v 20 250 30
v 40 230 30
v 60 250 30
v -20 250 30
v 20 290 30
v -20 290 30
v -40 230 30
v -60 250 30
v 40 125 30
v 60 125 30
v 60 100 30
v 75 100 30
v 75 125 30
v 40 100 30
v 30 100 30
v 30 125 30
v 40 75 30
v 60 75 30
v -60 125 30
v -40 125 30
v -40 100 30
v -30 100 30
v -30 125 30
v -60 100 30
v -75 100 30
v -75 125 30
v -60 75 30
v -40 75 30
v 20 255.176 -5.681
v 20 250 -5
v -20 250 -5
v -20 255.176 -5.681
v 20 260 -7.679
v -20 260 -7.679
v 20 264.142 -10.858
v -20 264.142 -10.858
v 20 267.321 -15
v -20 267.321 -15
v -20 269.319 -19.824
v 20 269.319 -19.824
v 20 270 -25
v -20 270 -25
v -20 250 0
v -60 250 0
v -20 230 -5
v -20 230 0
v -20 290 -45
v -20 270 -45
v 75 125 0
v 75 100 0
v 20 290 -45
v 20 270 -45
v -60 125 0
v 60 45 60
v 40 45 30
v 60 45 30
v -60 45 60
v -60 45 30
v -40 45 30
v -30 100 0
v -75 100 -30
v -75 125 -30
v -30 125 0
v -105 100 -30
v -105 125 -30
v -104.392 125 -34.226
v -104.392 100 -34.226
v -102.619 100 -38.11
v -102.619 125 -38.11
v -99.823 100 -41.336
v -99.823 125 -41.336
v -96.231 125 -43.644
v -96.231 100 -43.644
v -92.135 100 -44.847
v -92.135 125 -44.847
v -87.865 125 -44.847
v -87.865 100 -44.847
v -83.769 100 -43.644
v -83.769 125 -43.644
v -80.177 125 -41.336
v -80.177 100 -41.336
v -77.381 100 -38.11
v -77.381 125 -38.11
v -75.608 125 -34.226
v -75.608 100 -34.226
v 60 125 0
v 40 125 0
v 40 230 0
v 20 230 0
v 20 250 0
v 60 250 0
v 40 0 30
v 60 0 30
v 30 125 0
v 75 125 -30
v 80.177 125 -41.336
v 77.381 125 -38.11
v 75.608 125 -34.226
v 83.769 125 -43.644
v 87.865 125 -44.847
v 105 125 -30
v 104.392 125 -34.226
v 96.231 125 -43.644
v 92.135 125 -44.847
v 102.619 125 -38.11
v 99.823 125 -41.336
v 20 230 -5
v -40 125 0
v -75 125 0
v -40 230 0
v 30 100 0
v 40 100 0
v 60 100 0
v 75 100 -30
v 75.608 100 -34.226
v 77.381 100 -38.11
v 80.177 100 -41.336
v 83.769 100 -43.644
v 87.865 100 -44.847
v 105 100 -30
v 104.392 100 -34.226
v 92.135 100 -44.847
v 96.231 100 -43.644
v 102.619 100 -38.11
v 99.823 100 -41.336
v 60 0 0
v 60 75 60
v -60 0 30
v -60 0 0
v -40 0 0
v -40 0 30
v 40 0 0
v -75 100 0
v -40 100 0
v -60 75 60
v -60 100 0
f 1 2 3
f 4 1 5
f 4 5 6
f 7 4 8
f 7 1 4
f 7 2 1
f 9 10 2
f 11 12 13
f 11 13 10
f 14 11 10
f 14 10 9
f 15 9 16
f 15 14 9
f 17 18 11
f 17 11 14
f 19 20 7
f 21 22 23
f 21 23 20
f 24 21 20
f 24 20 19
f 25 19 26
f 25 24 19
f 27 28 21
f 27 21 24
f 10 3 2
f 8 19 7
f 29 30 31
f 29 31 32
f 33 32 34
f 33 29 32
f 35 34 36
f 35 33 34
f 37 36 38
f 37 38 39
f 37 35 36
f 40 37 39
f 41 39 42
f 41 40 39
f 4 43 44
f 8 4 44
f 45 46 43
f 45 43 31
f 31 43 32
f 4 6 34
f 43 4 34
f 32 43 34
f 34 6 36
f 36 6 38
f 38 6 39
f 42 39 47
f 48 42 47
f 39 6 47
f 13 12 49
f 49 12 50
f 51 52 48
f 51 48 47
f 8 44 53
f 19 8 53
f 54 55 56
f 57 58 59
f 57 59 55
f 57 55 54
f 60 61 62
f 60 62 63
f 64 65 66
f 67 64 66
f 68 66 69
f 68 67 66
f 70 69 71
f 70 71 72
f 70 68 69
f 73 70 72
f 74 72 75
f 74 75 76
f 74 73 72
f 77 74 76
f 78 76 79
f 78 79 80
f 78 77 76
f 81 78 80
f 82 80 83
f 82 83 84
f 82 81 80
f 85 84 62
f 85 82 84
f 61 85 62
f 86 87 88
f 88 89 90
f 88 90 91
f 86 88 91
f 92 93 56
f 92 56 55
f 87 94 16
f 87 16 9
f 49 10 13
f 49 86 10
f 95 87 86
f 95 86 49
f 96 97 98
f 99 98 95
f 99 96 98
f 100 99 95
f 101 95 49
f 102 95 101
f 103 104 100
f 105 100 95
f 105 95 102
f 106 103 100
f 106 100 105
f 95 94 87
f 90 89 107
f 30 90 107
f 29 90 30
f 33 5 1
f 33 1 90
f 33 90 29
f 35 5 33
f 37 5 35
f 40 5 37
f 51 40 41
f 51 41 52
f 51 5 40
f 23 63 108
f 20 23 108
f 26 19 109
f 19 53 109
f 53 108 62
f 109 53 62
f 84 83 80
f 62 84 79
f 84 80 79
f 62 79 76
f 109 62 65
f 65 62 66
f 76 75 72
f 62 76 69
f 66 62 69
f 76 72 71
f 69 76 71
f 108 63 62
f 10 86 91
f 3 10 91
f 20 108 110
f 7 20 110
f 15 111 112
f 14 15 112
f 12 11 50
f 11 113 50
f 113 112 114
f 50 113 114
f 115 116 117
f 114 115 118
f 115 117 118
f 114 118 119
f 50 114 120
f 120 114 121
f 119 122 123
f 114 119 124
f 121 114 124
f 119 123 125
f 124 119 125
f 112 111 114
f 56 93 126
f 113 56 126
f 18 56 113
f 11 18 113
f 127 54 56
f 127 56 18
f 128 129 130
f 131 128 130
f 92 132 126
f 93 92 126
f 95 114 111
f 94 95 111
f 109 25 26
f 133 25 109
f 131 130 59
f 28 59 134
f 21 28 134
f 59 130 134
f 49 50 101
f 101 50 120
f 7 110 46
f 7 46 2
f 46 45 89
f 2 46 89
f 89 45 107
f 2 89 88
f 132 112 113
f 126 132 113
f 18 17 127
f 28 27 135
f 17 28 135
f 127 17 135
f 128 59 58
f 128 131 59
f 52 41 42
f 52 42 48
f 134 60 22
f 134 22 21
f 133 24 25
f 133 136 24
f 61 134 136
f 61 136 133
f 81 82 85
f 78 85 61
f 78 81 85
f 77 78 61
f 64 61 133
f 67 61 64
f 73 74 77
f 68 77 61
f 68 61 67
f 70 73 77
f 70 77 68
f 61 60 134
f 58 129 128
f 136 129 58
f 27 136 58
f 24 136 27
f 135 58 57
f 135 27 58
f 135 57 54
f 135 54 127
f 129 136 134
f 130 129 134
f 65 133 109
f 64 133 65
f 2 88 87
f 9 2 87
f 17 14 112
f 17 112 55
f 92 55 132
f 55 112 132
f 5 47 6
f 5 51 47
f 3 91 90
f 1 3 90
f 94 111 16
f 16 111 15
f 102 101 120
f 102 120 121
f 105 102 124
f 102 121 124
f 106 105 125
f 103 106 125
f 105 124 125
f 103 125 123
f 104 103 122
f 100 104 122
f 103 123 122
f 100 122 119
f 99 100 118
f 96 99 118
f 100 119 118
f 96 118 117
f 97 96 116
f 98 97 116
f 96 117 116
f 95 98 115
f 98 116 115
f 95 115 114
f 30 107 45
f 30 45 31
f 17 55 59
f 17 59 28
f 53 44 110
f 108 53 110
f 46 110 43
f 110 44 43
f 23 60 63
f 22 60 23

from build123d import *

# Parameters (mm, degrees)
BOSS_EXTRUDE1_DEPTH = 30
BOSS_EXTRUDE2_DEPTH = 25
BOSS_EXTRUDE8_REACH = 304.903
SKETCH5_W           = 30
SKETCH5_H           = 30
BOSS_EXTRUDE9_DEPTH = 20


with BuildPart() as part:
    # Sketch1 → Boss-Extrude1 (new body)
    with BuildSketch(Plane.XY):
        Polygon((-60, 0), (-40, 0), (-40, 230), (40, 230), (40, 0), (60, 0), (60, 250), (-60, 250), align=None)
    extrude(amount=BOSS_EXTRUDE1_DEPTH)

    # Sketch4 → Boss-Extrude2 (add)
    with BuildSketch(Plane(origin=(0, 100, 0), x_dir=(-1, 0, 0), z_dir=(0, -1, 0))):
        with BuildLine():
            Line((-60, -30), (-75, -30))
            Line((-75, -30), (-75, 0))
            Line((-75, 0), (-105, 30))
            ThreePointArc((-105, 30), (-90, 45), (-75, 30))
            Line((-75, 30), (-30, 0))
            Line((-30, 0), (-30, -30))
            Line((-30, -30), (-60, -30))
        make_face()
    boss_extrude2 = extrude(amount=-BOSS_EXTRUDE2_DEPTH)

    # Mirror1: Boss-Extrude2 across plane
    add(boss_extrude2.mirror(Plane(origin=(0, 0, 0), x_dir=(0, 0, 1), z_dir=(1, 0, 0))))

    # Boss-Extrude8: up to this face of the body (flat: up to its plane)
    boss_extrude8_end = Plane(part.part.faces().sort_by_distance((60, 50, 15))[0])
    # Sketch5 → Boss-Extrude8 (add, up to the picked face)
    with BuildSketch(Plane.ZY.offset(60), mode=Mode.PRIVATE) as boss_extrude8_sk1:
        with Locations((45, 60)):
            Rectangle(SKETCH5_W, SKETCH5_H)
    boss_extrude8_tool1 = split(extrude(boss_extrude8_sk1.sketch, amount=-BOSS_EXTRUDE8_REACH, mode=Mode.PRIVATE), bisect_by=boss_extrude8_end, keep=Keep.BOTH, mode=Mode.PRIVATE)
    add(boss_extrude8_tool1.solids().sort_by(Axis((-60, 60, 45), (1, 0, 0)))[0])

    # Sketch6 → Boss-Extrude9 (add, symmetric)
    with BuildSketch(Plane(origin=(0, 0, 0), x_dir=(0, 0, -1), z_dir=(1, 0, 0))):
        with BuildLine():
            Line((-30, 230), (5, 230))
            Line((5, 230), (5, 250))
            ThreePointArc((5, 250), (10.857864376, 264.142135624), (25, 270))
            Line((25, 270), (45, 270))
            Line((45, 270), (45, 290))
            Line((45, 290), (-30, 290))
            Line((-30, 290), (-30, 230))
        make_face()
    extrude(amount=BOSS_EXTRUDE9_DEPTH, both=True)


solid = part.part
